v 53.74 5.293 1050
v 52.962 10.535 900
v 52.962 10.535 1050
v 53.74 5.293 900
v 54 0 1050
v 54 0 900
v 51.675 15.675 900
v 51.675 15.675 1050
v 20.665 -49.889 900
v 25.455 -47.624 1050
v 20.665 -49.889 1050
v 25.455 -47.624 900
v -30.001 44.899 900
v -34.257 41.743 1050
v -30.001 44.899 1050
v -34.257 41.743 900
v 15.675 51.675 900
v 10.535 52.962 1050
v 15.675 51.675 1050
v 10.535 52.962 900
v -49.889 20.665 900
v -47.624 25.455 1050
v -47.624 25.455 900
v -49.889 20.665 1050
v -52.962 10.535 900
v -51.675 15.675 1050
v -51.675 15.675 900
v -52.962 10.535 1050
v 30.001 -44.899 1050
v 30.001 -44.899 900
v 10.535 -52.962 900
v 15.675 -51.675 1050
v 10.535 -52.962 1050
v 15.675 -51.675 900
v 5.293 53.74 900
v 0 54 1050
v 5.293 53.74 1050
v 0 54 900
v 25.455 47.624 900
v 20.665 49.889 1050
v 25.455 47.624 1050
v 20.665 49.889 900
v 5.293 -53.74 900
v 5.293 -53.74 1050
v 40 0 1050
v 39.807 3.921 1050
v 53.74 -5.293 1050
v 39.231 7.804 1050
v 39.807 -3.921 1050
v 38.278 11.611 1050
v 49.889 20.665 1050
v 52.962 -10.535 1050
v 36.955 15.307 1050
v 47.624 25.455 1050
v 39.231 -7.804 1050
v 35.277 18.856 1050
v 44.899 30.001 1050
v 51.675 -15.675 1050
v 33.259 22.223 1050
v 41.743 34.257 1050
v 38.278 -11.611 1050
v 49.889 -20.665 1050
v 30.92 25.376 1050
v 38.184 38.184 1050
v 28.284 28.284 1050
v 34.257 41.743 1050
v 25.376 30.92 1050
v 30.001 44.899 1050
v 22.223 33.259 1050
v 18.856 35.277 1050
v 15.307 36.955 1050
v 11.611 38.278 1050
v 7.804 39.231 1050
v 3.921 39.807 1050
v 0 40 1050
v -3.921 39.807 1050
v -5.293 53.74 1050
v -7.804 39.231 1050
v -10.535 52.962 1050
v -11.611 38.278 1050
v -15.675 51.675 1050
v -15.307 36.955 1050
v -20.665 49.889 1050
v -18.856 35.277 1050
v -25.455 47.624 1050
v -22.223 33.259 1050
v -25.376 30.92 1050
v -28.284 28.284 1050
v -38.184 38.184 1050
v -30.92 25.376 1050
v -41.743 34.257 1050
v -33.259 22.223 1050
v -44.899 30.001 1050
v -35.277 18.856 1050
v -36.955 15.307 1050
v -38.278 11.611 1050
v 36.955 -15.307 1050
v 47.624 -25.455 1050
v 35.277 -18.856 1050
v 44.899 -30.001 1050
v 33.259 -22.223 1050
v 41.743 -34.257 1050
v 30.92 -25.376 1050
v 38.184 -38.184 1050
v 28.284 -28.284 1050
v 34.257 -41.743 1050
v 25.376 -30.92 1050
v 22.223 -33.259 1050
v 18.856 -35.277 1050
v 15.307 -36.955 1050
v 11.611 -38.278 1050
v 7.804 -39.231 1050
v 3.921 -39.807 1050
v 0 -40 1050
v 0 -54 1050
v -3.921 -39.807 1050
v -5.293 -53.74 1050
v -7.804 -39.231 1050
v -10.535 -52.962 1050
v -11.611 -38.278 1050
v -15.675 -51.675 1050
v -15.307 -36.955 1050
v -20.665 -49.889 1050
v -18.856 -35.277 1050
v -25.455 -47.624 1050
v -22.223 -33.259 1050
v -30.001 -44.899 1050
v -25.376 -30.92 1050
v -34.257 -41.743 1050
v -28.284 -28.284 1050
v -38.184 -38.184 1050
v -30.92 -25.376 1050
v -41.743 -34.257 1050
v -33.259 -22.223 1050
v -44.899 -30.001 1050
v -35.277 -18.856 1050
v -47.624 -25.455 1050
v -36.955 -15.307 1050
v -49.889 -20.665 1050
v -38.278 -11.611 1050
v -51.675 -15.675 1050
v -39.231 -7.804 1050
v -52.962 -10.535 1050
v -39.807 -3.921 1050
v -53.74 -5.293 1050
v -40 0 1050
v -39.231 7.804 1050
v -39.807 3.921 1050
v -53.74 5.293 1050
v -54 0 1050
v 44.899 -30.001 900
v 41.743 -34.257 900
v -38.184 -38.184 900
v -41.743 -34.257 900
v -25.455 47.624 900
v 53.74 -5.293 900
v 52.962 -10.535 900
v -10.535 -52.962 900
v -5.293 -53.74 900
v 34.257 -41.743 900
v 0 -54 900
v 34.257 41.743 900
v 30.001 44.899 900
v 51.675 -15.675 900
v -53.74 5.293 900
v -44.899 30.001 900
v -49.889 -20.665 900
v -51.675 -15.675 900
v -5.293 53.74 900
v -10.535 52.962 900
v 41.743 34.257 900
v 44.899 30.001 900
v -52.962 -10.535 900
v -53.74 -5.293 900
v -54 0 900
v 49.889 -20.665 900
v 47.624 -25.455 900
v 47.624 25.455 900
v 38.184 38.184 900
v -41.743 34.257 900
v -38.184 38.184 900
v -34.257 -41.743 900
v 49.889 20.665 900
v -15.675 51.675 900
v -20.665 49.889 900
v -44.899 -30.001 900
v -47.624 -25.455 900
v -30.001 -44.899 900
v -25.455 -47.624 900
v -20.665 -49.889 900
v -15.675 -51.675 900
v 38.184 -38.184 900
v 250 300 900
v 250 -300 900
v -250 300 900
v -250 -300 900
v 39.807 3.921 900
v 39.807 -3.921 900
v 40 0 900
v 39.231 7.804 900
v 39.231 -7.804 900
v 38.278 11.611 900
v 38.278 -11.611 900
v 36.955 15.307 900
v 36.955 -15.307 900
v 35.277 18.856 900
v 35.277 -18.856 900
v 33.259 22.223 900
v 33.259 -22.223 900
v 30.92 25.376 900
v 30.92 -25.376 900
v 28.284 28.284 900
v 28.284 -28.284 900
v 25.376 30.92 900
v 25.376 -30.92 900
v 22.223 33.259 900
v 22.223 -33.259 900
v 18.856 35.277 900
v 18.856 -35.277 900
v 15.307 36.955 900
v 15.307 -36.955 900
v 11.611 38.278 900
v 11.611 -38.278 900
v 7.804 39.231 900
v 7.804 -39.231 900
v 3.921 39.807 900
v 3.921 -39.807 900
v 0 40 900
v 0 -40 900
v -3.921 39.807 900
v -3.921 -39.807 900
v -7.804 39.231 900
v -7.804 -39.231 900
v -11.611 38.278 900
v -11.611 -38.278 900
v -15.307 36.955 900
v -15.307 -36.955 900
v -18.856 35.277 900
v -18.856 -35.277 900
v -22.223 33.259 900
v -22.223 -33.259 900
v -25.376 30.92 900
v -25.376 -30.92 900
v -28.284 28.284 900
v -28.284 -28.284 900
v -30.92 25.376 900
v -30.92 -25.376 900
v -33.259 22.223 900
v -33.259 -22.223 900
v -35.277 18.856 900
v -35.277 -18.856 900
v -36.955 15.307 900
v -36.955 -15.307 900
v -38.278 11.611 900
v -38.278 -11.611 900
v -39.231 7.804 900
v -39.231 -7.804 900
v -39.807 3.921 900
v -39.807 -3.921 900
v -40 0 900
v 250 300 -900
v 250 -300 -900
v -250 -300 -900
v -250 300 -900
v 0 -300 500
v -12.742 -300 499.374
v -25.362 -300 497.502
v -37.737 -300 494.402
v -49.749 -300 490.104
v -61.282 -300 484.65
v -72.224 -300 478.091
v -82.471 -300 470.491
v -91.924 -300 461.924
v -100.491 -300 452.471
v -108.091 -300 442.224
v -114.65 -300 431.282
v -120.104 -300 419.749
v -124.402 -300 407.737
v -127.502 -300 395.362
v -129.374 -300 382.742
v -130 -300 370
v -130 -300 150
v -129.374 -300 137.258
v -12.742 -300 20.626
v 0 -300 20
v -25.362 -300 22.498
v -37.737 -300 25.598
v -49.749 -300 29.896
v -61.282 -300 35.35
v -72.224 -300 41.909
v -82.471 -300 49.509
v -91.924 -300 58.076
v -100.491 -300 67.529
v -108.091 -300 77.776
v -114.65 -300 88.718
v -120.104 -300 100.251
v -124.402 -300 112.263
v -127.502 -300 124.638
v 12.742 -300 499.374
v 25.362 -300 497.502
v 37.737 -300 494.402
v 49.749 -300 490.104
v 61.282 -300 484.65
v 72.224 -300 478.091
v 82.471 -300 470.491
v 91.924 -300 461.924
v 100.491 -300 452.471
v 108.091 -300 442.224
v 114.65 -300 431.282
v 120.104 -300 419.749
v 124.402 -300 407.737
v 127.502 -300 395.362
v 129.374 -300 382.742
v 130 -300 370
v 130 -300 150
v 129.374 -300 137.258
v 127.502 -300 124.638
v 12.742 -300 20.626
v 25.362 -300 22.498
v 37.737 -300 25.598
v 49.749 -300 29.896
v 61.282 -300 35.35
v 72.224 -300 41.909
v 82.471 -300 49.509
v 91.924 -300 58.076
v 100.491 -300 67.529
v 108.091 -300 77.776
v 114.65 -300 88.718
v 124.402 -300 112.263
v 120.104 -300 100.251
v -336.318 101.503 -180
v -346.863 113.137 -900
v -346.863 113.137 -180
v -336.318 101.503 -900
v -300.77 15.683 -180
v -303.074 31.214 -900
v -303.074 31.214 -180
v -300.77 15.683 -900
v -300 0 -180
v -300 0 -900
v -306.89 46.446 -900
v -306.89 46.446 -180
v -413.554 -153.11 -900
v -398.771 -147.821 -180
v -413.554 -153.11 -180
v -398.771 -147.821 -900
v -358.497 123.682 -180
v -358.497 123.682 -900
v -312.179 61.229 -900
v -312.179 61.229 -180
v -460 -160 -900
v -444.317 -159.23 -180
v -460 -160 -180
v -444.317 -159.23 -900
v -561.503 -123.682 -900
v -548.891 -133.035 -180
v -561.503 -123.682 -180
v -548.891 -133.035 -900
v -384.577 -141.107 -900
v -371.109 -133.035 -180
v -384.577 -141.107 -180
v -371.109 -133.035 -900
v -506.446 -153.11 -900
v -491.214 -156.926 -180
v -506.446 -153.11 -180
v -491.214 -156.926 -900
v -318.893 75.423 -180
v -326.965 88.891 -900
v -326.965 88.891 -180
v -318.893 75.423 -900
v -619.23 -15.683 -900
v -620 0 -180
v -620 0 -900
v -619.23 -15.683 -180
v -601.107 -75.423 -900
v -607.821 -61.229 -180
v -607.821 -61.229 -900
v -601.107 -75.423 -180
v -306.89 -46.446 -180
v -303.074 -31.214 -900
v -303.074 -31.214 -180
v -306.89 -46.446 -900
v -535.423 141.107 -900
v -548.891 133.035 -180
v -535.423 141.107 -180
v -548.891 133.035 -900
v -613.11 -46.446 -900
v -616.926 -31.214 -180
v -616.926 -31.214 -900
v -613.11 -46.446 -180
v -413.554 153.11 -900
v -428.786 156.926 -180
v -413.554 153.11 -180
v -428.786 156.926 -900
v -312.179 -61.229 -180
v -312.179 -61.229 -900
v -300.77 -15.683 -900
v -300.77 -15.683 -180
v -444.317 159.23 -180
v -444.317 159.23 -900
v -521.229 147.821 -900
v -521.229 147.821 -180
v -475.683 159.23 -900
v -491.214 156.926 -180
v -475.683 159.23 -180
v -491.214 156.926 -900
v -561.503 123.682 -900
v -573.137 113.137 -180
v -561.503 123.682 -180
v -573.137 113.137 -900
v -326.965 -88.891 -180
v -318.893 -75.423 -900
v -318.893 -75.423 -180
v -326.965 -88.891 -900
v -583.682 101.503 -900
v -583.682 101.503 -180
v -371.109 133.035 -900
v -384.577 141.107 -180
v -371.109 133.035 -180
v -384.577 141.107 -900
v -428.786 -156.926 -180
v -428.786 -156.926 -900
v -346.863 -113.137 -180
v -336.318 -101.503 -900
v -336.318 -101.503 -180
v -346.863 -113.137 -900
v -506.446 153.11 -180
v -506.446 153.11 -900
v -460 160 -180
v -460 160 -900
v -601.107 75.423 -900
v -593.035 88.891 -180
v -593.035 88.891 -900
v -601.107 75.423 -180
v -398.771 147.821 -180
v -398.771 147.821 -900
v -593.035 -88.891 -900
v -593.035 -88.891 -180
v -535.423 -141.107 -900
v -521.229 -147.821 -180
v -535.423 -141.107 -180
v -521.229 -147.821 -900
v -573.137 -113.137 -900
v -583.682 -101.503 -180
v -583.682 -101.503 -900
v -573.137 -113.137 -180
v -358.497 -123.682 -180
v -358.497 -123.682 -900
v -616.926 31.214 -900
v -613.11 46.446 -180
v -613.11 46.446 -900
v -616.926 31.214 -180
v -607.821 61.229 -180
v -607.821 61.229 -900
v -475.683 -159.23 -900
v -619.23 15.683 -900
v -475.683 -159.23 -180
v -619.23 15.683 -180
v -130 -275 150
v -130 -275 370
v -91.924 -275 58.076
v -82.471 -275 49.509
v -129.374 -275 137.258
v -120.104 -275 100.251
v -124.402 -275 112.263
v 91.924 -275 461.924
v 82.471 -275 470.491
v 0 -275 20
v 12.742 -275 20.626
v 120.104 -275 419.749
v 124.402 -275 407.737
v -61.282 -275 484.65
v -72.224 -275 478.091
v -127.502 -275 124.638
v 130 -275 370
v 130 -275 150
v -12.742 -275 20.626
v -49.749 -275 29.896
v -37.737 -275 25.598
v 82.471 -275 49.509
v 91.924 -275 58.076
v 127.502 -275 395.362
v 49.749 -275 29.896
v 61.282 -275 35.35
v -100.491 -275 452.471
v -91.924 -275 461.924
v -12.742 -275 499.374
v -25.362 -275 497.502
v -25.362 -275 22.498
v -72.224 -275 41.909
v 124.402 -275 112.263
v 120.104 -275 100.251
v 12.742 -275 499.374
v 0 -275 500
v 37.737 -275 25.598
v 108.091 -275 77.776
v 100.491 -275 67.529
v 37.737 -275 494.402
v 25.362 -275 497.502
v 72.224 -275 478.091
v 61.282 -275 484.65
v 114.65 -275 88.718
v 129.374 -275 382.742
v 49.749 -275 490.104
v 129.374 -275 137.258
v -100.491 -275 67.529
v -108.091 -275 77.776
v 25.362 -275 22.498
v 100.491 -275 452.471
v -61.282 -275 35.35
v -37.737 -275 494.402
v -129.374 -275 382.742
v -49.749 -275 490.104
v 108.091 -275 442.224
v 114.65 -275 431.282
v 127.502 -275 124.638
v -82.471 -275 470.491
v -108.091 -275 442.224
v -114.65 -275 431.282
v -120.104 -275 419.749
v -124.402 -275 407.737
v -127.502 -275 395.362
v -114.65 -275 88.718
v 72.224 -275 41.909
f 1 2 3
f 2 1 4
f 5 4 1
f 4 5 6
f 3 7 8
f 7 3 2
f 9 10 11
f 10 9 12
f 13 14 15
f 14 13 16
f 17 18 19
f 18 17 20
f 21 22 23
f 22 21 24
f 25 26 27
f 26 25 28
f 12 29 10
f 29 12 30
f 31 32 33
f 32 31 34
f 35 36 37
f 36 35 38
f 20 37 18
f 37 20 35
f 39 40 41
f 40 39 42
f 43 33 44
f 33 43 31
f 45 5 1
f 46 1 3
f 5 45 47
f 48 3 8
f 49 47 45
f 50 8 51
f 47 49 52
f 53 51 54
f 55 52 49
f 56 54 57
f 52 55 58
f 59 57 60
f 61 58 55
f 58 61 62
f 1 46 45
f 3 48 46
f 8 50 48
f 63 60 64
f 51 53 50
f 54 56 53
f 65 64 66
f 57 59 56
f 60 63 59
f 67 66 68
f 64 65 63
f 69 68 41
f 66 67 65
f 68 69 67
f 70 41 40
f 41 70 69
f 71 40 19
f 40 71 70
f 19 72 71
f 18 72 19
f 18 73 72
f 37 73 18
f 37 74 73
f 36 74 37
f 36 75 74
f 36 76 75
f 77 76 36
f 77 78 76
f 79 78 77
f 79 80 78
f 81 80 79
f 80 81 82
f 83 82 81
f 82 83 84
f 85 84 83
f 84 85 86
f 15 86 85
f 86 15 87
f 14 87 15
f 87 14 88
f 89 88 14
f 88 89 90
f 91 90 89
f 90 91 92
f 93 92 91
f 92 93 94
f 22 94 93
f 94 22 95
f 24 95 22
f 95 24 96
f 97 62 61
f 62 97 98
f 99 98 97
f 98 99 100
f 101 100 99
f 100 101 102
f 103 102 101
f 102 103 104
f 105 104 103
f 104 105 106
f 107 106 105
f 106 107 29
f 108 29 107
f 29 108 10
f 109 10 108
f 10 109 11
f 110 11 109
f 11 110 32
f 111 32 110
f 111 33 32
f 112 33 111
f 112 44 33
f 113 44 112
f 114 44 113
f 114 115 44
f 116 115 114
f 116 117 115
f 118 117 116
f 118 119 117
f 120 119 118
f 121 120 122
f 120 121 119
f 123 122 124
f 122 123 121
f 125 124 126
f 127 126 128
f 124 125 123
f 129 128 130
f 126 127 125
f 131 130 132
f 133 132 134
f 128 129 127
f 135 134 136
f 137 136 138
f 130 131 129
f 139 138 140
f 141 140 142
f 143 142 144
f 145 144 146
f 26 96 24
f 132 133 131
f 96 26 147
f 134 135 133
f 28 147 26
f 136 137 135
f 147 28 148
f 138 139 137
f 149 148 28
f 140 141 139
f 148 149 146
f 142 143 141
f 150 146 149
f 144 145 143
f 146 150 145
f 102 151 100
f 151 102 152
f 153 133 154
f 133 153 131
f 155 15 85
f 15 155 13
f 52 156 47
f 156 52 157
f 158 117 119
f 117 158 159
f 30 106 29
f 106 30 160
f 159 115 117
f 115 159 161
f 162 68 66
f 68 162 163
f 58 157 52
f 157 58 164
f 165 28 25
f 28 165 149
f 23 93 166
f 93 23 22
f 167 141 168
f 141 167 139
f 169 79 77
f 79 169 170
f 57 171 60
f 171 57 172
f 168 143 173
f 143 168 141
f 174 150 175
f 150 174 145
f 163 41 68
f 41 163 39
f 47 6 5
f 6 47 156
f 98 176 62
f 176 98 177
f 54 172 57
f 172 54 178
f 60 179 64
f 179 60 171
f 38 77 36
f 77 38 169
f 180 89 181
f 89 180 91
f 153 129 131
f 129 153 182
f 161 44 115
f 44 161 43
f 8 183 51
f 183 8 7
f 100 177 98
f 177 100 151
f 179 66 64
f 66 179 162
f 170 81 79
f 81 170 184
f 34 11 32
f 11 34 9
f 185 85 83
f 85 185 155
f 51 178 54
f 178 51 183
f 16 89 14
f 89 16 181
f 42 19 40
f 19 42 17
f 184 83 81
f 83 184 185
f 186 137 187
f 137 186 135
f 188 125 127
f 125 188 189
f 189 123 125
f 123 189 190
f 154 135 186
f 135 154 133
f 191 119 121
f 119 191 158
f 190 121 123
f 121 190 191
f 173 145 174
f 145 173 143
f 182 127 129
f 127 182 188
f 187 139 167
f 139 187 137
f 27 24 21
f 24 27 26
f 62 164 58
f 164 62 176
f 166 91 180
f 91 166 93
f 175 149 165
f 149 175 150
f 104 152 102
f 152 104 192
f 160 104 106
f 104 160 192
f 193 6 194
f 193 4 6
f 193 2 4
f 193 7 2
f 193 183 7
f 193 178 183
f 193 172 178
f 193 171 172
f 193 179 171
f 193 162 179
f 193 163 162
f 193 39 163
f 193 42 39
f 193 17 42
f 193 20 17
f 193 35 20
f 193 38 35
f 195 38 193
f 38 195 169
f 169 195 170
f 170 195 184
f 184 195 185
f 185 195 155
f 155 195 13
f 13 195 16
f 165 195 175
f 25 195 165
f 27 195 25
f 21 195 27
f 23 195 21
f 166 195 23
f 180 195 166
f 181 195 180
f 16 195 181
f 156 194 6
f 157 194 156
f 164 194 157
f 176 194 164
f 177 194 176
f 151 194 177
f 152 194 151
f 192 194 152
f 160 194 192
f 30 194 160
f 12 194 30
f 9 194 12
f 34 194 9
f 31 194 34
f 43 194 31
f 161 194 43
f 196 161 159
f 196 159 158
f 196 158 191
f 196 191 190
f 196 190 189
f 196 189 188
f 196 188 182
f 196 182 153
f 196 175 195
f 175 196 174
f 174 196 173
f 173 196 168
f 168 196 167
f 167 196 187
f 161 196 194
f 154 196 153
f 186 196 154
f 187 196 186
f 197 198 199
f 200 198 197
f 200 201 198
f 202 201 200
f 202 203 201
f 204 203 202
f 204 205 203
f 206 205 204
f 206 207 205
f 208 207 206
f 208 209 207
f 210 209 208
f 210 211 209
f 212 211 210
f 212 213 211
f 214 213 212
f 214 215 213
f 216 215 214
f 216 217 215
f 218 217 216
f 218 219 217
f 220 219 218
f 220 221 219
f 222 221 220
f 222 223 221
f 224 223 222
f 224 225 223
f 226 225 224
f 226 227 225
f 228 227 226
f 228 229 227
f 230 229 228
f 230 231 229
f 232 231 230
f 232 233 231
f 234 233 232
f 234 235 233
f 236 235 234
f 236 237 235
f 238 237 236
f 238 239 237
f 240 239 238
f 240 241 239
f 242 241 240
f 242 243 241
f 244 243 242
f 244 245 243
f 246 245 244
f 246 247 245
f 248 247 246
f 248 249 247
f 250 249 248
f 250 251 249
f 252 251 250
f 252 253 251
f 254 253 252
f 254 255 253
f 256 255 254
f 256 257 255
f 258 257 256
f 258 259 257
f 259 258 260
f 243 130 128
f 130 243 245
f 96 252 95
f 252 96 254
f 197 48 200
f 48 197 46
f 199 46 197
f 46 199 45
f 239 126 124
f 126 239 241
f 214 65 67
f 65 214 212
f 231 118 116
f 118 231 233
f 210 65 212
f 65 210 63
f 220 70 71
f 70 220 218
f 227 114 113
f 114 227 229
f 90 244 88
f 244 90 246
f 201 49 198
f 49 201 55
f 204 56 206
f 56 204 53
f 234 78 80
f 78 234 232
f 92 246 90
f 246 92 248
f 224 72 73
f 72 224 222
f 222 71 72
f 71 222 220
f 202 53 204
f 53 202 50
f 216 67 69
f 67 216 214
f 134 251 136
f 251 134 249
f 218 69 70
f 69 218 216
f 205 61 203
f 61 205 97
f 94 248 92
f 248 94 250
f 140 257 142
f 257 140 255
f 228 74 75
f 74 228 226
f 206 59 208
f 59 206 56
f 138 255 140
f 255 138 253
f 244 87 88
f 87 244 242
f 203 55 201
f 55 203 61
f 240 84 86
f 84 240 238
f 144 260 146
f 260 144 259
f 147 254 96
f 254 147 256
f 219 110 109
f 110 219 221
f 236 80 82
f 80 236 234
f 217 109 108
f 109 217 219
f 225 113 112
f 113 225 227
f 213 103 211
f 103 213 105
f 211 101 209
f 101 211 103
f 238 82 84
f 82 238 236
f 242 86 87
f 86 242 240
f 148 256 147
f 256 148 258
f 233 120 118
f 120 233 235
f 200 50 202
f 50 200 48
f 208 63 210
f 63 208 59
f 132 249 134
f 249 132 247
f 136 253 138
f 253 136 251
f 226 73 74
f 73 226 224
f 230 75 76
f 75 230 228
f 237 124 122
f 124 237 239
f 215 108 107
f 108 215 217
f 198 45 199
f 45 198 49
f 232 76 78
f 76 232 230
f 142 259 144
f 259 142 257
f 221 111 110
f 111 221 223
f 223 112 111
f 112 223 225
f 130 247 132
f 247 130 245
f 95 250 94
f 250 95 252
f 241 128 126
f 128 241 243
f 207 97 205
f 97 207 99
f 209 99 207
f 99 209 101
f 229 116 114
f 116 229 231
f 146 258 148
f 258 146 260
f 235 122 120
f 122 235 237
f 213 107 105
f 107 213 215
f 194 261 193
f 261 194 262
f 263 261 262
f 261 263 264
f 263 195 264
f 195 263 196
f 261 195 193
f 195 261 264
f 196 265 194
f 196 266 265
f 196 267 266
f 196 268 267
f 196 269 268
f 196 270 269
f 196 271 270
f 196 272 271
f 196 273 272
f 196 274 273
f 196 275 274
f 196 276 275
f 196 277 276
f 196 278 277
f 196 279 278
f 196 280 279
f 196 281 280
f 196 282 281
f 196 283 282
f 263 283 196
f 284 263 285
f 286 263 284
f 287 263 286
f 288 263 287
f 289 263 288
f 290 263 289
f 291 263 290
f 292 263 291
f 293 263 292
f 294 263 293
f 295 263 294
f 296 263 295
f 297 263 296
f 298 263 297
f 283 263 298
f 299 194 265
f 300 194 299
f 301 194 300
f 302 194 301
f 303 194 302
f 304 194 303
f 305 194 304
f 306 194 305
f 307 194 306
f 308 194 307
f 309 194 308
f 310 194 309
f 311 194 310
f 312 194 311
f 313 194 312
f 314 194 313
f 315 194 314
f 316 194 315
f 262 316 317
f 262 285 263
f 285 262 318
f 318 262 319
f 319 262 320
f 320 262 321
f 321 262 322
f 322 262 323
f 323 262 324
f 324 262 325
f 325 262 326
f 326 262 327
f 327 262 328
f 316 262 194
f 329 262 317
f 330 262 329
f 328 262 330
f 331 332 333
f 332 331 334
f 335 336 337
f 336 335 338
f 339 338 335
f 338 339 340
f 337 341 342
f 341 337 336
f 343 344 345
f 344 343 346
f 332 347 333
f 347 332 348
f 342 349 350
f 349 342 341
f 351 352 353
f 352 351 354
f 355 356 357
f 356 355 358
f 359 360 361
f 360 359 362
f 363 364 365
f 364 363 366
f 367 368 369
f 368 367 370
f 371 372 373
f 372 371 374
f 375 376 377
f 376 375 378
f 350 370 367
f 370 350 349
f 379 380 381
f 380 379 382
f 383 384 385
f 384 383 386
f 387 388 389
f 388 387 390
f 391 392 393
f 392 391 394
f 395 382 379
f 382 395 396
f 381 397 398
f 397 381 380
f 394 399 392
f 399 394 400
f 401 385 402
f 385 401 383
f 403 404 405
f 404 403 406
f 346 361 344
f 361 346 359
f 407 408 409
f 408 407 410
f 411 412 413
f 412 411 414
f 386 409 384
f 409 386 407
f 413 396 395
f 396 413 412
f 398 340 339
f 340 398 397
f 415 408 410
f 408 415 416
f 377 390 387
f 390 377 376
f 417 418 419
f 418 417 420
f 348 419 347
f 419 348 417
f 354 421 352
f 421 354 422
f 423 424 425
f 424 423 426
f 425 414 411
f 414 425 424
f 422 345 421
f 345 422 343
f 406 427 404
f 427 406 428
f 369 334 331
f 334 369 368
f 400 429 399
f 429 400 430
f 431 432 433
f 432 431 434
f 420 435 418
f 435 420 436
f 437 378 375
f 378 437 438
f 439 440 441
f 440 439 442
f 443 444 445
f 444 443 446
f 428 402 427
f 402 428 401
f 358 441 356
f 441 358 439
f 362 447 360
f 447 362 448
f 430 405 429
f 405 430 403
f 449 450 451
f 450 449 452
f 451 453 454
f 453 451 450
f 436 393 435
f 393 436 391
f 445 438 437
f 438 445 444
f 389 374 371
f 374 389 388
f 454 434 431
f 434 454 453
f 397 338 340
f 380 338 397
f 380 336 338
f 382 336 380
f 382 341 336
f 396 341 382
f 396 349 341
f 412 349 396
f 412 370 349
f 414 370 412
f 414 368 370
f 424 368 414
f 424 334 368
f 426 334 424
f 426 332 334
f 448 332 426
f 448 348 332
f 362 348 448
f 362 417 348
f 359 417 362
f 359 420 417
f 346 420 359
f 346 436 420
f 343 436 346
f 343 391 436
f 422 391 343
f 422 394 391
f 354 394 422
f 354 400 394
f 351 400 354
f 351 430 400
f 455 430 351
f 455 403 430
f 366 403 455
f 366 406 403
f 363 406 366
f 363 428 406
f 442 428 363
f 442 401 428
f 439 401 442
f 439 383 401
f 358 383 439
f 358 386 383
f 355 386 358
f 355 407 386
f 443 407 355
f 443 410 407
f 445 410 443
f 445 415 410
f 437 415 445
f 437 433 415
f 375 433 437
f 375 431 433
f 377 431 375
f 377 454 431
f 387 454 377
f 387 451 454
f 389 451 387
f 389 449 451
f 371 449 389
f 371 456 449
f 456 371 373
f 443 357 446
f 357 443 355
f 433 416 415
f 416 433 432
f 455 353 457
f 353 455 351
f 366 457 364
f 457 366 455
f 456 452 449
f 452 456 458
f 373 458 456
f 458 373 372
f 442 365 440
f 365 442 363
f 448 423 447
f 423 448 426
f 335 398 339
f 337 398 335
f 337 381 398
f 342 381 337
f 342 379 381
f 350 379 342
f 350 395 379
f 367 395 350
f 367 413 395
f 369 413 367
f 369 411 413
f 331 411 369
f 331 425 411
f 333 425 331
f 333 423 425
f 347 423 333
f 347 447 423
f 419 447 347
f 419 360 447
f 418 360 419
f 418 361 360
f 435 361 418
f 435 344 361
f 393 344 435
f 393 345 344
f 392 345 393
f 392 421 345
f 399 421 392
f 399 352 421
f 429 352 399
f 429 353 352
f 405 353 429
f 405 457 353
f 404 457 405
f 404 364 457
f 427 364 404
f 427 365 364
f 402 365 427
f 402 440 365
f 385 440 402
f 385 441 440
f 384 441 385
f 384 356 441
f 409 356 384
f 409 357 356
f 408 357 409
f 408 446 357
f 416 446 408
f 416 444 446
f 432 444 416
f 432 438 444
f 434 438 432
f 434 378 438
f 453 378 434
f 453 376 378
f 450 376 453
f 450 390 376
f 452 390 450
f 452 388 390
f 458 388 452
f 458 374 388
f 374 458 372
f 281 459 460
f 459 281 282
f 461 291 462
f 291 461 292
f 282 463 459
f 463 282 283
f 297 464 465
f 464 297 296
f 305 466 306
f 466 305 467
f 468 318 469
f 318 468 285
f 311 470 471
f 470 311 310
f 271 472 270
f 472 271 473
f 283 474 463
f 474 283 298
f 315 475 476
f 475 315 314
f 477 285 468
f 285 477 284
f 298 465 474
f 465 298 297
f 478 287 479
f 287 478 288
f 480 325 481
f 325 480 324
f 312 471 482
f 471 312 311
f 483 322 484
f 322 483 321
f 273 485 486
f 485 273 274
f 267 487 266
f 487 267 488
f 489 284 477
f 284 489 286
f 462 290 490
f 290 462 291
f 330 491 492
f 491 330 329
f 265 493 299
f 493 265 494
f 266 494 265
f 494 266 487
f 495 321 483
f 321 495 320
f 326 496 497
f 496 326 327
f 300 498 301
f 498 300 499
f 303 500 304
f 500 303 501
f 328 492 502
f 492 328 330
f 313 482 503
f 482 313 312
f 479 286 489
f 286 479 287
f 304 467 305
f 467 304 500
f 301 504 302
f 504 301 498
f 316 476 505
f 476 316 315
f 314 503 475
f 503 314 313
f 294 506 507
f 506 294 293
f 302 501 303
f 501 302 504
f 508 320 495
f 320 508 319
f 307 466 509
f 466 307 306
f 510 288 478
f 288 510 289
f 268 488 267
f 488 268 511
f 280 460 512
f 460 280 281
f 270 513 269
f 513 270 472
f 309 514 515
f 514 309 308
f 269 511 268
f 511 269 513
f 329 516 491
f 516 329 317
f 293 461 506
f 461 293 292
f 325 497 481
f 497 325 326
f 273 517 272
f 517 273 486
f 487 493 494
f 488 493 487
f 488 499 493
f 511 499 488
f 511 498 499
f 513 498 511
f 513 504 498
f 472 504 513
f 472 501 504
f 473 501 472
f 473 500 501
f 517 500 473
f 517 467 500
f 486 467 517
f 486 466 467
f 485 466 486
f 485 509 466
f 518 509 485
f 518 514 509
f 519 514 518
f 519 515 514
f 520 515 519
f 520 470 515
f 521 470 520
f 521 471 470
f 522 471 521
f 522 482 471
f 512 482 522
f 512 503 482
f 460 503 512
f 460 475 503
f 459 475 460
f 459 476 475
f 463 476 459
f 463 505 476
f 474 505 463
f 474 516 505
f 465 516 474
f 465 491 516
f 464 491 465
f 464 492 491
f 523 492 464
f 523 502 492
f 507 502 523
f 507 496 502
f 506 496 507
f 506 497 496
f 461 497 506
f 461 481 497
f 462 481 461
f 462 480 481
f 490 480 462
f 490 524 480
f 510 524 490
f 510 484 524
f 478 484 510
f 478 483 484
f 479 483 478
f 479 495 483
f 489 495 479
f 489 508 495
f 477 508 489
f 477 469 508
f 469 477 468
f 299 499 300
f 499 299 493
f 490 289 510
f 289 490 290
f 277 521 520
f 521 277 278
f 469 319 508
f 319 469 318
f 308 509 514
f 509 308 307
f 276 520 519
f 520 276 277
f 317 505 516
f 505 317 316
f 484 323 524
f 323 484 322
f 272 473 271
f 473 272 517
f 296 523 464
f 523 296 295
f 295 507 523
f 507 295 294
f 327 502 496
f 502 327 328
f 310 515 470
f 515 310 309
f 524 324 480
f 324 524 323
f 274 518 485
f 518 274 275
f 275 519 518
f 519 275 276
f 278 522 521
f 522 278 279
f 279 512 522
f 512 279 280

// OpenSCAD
// ============================================================================
// Atom Lithography Machine — Parametric OpenSCAD Module (S7.SAFETY-01)
// ============================================================================
// part_id           : S7.SAFETY-01
// parent_bom_id     : S7.SAFETY
// subsystem         : S7
// part_name         : Sub-Atmosferik SDS PH3 Mikro-Tup Gaz Kabini (<650 Torr, 10 g), Vakum-Ceketli Hat, 250 CFM Kuru Yikayici & Cift 0.02 ppm Sensor (Exp150, 118.0 kg)
// material          : 316L
// temp_stage        : 300 K (tesis gaz bolmesi)
// vacuum_grade      : Atmosfer (250 CFM egzoz)
// tolerance         : PH3<=0.02 ppm alarm (SIL-3)
// computed_mass_kg  : 118.00000
// envelope_mm       : 875.000 x 655.500 x 2060.000
// design_maturity   : M0_M1_DETAILED_CAD_DESIGN_ONLY
// no_lab_measurement: true
// iec61508_certified: false
// semi_s2_certified : false
// Units: millimeters (mm)
// ============================================================================

$fn = 64;

// Nominal bounding envelope parameters (mm)
bbox_x = 875.0000;
bbox_y = 655.5000;
bbox_z = 2060.0000;

// Part-specific parametric dimensions
cab_dx_mm = 500.0;
cab_dy_mm = 600.0;
cab_dz_mm = 1800.0;
scrubber_od_mm = 320.0;
exhaust_cfm = 250;

// Interface / port parameters (mm)
port_ph3_vcr_outlet_od = 19.000;
port_ph3_vcr_outlet_bore = 4.500;
port_exhaust_250cfm_dn100_od = 114.000;
port_exhaust_250cfm_dn100_bore = 100.000;

module part_S7_SAFETY_01() {
  difference() {
    union() {
      // SEMI S2 target SDS PH3 gas cabinet
      cube([500.000, 600.000, 1800.000], center=true);
      // 250 CFM dry-bed chemical scrubber
      translate([-460.000, 0.000, -540.000]) cylinder(d=320.000, h=720.000, center=true);
      // DN100 vacuum-jacketed exhaust riser
      translate([0.000, 0.000, 975.000]) {
        difference() {
          cylinder(d=108.000, h=150.000, center=true);
          cylinder(d=80.000, h=152.000, center=true);
        }
      }
    }
    // Armored front inspection window
    translate([0.000, -295.000, 260.000]) rotate([90.000, 90.000, 0.000]) {
      hull() {
        translate([-110.000, 0, 0]) cylinder(d=260.000, h=40.000, center=true);
        translate([110.000, 0, 0]) cylinder(d=260.000, h=40.000, center=true);
      }
    }
  }
}

// World assembly mounting transform (global machine frame, mm / deg):
// translate([-1600.000, 400.000, 900.000]) rotate([0.000, 0.000, 0.000]) part_S7_SAFETY_01();

part_S7_SAFETY_01();
